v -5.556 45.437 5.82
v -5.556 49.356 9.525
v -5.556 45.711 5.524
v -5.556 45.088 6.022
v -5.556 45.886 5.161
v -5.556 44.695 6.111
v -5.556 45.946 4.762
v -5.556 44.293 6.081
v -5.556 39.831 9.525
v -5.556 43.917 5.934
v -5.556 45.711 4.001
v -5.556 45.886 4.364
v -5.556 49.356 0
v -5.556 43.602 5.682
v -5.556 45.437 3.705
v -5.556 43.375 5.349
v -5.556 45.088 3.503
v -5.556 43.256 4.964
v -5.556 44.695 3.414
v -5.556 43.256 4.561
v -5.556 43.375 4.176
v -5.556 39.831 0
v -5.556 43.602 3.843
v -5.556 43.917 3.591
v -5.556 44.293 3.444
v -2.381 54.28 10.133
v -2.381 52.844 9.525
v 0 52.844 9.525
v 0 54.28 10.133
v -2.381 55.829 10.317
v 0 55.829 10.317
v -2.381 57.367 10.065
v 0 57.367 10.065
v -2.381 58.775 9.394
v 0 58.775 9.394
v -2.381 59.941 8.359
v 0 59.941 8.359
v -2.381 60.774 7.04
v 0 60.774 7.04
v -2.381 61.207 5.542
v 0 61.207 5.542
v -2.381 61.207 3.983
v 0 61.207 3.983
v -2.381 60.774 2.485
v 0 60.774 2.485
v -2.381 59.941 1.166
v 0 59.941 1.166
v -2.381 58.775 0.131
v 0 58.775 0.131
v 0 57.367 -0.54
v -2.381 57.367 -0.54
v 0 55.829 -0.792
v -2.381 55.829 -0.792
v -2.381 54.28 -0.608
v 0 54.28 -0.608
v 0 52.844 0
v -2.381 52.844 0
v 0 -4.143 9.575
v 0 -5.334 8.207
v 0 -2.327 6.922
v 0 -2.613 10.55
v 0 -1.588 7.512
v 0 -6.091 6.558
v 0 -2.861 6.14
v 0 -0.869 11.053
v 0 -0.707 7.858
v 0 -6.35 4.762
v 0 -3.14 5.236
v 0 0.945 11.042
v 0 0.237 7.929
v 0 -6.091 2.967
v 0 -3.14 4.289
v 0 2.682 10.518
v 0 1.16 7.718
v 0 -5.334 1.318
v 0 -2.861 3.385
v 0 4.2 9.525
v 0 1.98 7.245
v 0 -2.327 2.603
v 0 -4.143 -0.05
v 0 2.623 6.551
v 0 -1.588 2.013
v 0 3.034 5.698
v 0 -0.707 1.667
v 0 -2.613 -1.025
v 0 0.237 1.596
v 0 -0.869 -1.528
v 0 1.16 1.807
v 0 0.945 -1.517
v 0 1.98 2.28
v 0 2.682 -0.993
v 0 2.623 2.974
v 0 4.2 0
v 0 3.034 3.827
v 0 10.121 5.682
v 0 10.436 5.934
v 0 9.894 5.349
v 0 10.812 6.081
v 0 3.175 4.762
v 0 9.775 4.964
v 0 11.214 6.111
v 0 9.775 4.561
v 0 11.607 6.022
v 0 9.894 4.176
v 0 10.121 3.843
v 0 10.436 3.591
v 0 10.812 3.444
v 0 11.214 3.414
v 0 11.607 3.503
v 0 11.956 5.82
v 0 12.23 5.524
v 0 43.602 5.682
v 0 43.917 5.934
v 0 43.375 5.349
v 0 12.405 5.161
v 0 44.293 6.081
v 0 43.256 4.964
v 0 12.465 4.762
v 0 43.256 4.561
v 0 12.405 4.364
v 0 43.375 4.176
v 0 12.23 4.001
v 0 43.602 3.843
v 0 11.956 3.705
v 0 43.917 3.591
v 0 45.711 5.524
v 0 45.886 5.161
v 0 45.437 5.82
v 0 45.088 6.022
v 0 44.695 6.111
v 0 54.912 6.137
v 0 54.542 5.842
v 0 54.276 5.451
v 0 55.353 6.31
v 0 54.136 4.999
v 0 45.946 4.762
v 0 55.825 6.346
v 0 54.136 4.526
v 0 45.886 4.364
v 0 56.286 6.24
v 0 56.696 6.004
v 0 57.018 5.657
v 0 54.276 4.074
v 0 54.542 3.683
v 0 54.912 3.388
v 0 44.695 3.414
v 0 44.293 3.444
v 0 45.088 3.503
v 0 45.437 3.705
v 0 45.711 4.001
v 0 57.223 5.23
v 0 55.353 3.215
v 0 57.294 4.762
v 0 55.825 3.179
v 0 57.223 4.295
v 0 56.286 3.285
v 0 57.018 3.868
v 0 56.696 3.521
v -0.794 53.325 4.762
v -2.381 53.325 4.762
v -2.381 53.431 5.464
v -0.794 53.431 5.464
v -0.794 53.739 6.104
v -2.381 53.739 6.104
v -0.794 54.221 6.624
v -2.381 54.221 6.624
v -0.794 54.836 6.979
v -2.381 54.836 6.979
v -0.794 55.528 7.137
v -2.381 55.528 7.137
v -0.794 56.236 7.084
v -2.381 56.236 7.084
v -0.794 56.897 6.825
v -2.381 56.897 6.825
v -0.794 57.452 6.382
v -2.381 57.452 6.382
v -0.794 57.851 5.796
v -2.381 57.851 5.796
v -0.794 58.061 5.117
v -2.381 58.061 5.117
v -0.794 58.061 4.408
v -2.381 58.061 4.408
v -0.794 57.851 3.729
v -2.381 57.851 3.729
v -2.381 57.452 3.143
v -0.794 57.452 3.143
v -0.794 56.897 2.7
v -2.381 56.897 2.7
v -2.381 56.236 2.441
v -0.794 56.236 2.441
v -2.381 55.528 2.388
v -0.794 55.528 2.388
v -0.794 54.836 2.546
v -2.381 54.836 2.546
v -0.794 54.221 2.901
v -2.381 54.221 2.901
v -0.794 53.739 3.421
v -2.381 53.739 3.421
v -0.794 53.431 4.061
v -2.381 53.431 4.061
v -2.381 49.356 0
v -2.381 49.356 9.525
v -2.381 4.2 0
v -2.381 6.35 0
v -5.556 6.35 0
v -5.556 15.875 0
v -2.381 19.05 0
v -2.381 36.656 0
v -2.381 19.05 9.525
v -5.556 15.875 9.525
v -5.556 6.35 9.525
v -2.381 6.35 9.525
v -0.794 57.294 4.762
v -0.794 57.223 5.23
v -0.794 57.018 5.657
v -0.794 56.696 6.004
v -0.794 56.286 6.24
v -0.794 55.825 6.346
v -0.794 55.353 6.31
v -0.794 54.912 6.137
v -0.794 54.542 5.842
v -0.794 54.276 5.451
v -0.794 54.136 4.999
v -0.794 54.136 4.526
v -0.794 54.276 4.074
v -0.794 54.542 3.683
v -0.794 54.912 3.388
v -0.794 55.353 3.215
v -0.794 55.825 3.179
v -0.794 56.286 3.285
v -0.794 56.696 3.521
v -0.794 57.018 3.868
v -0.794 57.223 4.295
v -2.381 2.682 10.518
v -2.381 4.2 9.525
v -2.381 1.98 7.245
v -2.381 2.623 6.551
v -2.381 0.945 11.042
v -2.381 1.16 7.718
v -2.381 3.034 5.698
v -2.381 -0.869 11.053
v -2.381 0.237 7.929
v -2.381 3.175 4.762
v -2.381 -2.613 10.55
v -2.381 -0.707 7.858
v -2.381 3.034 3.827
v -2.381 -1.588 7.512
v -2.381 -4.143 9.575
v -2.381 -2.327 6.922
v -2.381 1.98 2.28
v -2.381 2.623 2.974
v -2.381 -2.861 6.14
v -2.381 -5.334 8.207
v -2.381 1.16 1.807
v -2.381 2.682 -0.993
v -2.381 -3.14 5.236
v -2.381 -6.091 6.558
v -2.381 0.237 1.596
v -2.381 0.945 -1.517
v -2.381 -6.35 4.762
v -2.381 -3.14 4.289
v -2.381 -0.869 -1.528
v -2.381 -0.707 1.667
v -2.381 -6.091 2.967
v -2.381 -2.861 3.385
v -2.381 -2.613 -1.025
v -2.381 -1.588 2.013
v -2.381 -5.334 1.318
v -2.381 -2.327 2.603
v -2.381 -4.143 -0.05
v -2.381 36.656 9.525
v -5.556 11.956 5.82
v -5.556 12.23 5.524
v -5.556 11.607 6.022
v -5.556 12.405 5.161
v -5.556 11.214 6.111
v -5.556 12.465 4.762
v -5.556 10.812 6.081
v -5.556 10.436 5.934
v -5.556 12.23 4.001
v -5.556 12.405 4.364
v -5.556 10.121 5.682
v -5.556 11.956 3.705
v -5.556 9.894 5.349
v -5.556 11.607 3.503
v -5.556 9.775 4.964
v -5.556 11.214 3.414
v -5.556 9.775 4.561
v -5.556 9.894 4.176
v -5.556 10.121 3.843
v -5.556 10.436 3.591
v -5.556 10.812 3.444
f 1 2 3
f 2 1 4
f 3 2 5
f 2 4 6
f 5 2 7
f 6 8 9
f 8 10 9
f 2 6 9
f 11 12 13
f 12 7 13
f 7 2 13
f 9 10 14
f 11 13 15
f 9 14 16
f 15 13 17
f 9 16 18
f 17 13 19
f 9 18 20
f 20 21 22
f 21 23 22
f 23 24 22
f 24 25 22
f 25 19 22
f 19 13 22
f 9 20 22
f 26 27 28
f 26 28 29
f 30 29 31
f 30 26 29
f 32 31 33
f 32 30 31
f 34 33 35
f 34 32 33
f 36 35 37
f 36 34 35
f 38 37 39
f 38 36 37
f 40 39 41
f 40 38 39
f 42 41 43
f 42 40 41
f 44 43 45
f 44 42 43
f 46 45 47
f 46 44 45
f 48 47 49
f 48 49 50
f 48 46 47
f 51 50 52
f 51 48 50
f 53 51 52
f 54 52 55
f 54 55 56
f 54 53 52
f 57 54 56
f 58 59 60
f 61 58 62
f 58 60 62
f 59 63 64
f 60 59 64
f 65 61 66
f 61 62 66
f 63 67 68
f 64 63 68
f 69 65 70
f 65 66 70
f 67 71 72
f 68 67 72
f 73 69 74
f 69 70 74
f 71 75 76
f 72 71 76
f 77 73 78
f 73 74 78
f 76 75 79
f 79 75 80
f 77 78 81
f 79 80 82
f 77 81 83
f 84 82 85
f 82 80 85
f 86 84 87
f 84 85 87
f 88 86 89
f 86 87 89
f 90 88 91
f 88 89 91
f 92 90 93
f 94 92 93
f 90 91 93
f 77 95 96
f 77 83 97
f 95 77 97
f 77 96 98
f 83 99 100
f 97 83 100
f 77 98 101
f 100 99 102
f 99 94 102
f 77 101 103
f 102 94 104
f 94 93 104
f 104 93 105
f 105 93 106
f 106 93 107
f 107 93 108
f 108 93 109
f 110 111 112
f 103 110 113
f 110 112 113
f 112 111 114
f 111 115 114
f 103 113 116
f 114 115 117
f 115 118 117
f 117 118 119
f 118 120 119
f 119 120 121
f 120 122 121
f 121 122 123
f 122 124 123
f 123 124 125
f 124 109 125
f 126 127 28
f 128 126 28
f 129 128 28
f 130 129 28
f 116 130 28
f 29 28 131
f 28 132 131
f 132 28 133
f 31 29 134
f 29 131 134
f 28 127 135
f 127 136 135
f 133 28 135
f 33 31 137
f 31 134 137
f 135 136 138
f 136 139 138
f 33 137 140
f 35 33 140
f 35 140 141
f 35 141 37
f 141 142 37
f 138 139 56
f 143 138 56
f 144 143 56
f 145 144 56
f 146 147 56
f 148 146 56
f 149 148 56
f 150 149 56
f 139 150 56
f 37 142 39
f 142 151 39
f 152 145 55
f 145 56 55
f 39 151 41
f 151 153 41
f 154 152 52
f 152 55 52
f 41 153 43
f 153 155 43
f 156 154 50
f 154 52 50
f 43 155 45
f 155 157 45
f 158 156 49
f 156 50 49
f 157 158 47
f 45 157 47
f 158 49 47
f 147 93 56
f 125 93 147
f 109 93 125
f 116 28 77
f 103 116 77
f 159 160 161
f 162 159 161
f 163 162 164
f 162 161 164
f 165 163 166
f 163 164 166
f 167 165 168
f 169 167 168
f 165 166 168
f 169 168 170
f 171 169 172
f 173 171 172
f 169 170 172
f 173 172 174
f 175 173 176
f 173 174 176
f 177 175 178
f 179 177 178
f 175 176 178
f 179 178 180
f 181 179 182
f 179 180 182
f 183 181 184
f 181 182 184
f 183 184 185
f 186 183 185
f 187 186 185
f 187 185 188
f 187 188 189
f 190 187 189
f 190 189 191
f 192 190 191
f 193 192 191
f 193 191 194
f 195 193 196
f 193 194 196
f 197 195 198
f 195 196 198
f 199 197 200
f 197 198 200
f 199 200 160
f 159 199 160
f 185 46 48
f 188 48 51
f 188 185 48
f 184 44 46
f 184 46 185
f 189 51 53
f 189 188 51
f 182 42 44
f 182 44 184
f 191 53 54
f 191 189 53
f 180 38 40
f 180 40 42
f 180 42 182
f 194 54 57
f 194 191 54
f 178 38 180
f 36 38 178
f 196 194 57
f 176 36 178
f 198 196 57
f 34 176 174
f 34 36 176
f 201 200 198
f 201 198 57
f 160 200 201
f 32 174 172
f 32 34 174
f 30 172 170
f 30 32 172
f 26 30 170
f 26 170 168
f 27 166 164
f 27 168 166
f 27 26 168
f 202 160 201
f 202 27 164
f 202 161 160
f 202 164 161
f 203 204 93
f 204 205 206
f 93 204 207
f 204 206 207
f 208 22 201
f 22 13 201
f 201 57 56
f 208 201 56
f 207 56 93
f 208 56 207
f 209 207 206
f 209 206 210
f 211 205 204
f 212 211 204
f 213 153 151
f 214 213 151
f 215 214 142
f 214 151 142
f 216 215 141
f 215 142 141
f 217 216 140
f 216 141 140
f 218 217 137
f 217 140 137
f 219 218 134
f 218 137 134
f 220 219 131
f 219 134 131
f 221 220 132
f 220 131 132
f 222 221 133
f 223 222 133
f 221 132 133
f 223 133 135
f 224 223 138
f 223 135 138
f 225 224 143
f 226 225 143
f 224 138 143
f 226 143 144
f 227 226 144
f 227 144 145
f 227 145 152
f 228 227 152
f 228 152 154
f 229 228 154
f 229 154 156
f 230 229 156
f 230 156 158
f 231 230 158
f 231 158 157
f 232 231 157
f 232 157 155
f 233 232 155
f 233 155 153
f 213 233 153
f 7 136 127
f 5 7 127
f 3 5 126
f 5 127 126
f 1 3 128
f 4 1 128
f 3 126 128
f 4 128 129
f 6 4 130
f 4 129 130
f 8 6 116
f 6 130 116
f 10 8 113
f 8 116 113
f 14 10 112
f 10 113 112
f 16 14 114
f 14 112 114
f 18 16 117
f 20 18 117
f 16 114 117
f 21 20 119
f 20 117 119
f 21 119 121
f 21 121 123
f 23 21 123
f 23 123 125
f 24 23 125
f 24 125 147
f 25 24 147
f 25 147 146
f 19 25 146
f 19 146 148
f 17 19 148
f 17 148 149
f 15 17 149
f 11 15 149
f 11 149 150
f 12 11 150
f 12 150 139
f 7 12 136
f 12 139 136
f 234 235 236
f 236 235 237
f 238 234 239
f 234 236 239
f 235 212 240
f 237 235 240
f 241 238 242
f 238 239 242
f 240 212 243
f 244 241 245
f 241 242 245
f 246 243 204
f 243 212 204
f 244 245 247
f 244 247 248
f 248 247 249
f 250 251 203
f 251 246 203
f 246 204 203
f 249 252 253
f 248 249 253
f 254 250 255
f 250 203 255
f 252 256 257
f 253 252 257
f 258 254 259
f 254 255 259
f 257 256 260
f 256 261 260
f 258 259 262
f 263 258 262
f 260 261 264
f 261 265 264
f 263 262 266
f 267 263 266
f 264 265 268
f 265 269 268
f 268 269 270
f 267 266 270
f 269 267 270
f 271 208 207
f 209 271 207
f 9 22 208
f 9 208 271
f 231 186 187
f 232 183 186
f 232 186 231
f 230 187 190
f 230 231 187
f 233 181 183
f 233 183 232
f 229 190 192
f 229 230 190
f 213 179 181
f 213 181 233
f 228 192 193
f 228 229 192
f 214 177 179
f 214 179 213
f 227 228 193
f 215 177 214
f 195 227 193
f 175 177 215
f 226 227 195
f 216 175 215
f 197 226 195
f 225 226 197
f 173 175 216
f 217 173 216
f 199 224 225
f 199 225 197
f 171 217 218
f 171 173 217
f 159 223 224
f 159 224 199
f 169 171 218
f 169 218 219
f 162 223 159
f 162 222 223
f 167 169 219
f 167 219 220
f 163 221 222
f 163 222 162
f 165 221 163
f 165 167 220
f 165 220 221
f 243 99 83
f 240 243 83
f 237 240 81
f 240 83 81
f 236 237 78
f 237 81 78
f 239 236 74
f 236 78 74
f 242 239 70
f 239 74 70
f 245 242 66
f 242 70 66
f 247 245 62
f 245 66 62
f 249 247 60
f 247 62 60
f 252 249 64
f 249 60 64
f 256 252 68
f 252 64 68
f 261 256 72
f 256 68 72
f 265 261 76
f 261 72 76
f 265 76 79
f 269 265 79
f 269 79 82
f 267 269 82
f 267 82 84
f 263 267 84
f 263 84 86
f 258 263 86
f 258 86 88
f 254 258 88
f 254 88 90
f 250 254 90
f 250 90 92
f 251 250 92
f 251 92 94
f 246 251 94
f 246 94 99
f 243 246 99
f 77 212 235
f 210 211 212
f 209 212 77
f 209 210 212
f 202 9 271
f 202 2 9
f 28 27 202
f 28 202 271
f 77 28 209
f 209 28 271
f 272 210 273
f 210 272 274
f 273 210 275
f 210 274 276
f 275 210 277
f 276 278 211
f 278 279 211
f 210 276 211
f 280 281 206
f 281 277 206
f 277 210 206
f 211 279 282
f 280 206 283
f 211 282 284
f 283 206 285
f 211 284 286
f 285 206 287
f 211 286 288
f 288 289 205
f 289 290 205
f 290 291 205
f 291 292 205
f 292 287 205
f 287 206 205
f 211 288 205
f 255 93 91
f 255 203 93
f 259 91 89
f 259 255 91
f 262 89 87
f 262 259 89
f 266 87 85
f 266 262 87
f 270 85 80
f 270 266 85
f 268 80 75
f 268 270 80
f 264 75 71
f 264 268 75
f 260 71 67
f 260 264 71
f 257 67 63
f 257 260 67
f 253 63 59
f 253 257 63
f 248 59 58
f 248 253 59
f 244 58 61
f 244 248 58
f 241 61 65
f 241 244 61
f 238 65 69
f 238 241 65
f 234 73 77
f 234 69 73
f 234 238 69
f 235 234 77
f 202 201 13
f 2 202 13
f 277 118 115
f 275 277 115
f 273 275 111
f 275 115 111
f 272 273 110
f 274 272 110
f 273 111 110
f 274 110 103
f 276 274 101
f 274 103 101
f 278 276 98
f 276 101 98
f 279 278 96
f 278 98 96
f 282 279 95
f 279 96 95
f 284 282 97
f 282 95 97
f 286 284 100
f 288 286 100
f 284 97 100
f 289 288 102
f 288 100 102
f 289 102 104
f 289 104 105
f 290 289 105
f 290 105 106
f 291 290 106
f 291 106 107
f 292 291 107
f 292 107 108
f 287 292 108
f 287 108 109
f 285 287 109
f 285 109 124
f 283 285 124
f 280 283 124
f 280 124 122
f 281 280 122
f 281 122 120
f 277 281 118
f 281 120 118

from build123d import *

# Parameters (mm, degrees)
F1_DEPTH = 9.525
F2_R     = 5.55625
F2_R_2   = 6.35
F3_DEPTH = 2.38125
F4_R     = 3.175
F4_R_2   = 1.35255
F4_R_3   = 1.5875
F5_DEPTH = 5.55625
F6_R     = 2.38125
F7_DEPTH = 1.5875
F8_SIZE  = 3.17499


# Not quite as in the source:
# - a fillet or chamfer is up to 0.001 mm smaller than in the source, because OpenCascade refuses the exact size


with BuildPart() as f1:
    # F0 (on Top) → F1 (new body)
    with BuildSketch(Plane.XY):
        Polygon((0, 0), (0, 55.7060608), (-2.38125, 55.7060608), (-2.38125, 49.3560608), (-5.55625, 49.3560608), (-5.55625, 39.8310608), (-2.38125, 39.8310608), (-2.38125, 15.875), (-5.55625, 15.875), (-5.55625, 6.35), (-2.38125, 6.35), (-2.38125, 0), align=None)
    extrude(amount=F1_DEPTH)

    # F2 (on face) → F3 (join, through all)
    with BuildSketch(Plane(origin=(-2.38125, 0, 0), x_dir=(0, -1, 0), z_dir=(-1, 0, 0))):
        with Locations((-55.7060608, 4.7625)):
            Circle(F2_R)
        with Locations((0, 4.7625)):
            Circle(F2_R_2)
    extrude(amount=-F3_DEPTH)

    # F4 (on face) → F5 (cut, through all)
    with BuildSketch(Plane.YZ):
        with Locations((0, 4.7625)):
            Circle(F4_R)
        with Locations((11.1125, 4.7625)):
            Circle(F4_R_2)
        with Locations((44.5935608, 4.7625)):
            Circle(F4_R_2)
        with Locations((55.7060608001, 4.7625)):
            Circle(F4_R_3)
    extrude(amount=-F5_DEPTH, mode=Mode.SUBTRACT)

    # F6 (on face) → F7 (cut)
    with BuildSketch(Plane(origin=(-2.38125, 0, 0), x_dir=(0, -1, 0), z_dir=(-1, 0, 0))):
        with Locations((-55.7060608, 4.7625)):
            Circle(F6_R)
    extrude(amount=-F7_DEPTH, mode=Mode.SUBTRACT)

    # F8 (size 3.175 in the source; OpenCascade refuses exactly that, so slightly less here)
    f8_edges = [f1.edges().sort_by_distance(p)[0] for p in [
        (-2.38125, 39.831061, 4.7625),
        (-2.38125, 15.875, 4.7625),
    ]]
    chamfer(f8_edges, length=F8_SIZE)


solid = f1.part
